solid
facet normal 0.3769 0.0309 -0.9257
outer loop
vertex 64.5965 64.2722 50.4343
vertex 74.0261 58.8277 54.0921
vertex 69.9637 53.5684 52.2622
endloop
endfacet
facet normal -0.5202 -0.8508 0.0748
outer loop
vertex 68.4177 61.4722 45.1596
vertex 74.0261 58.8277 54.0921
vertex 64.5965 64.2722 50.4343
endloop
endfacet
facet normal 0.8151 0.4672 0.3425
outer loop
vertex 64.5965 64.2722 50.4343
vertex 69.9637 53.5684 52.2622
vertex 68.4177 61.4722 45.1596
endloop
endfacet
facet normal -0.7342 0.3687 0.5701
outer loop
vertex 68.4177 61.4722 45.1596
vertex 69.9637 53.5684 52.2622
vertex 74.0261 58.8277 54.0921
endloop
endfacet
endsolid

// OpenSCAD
// Auto-generated auxetic polyhedron
points = [
    [69.963676, 53.568438, 52.262196],
    [74.026078, 58.827704, 54.092069],
    [64.596495, 64.272213, 50.434293],
    [68.417669, 61.472201, 45.159591],
];

faces = [
    [0, 1, 2],
    [2, 1, 3],
    [3, 0, 2],
    [1, 0, 3],
];

polyhedron(points = points, faces = faces);
